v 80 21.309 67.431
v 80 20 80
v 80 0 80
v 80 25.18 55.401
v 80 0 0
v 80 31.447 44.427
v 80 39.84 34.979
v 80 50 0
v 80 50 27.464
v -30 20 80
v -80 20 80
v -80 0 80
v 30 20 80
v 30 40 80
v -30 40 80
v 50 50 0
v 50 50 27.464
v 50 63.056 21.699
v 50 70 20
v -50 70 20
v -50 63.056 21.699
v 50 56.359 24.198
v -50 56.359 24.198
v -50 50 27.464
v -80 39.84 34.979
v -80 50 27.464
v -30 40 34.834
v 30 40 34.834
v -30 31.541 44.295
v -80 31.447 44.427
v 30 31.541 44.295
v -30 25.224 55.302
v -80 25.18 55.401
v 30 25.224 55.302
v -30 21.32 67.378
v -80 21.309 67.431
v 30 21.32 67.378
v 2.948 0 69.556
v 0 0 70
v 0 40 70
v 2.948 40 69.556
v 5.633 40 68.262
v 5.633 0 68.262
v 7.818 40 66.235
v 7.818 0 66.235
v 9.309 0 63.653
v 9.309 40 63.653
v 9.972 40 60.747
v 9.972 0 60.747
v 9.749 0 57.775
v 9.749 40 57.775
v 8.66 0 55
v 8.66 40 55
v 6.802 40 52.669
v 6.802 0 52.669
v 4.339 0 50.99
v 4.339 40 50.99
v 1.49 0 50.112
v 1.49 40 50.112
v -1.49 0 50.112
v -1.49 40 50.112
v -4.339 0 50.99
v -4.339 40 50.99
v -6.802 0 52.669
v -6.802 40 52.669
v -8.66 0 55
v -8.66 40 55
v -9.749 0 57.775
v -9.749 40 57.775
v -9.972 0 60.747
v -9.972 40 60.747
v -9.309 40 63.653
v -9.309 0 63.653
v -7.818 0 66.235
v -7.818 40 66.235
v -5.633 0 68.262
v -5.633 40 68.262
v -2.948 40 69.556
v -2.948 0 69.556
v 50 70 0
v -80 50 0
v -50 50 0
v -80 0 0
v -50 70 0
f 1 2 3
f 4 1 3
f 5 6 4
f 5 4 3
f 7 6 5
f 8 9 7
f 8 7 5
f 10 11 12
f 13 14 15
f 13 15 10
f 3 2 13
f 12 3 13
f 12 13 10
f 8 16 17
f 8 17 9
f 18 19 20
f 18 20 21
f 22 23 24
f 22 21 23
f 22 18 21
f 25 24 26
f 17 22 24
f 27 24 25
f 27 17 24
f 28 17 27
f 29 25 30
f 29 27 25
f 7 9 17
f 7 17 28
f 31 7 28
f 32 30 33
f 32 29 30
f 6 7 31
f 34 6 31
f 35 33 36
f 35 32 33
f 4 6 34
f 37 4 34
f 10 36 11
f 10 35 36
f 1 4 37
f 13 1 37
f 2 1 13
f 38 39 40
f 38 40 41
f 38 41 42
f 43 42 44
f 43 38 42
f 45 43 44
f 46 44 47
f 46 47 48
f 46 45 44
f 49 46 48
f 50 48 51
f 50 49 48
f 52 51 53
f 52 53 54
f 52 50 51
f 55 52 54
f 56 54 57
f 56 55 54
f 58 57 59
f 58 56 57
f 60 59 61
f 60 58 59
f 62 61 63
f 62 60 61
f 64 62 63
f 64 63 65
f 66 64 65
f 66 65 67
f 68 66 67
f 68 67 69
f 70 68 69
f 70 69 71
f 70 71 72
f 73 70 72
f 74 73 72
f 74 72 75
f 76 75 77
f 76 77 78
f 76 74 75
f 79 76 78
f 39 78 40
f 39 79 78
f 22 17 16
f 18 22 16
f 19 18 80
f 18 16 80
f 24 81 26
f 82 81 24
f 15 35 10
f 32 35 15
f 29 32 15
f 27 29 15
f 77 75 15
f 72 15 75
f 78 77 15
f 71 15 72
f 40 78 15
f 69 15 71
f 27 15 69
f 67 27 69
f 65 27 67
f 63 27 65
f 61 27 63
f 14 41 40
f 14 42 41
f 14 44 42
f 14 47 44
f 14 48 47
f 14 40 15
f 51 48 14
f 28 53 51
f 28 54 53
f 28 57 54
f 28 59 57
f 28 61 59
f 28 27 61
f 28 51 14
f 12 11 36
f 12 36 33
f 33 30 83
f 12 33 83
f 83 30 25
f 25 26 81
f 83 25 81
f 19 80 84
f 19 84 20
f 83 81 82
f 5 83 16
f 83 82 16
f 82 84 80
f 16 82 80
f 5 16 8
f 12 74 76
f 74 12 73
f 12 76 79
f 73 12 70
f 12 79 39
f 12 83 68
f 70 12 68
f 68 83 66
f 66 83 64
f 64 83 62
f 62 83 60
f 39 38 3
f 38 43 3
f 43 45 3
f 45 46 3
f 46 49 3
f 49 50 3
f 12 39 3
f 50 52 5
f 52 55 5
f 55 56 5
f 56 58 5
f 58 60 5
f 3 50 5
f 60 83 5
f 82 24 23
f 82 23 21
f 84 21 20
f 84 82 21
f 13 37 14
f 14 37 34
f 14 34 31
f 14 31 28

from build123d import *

# Parameters (mm, degrees)
SALIENTE_EXTRUIR1_DEPTH    = 80
CROQUIS2_W                 = 30
CROQUIS2_H                 = 20
CORTAR_EXTRUIR1_DEPTH      = 81
CORTAR_EXTRUIR1_DEPTH_BACK = 1
CROQUIS3_W                 = 60
CROQUIS3_H                 = 40
SALIENTE_EXTRUIR2_DEPTH    = 80
CROQUIS4_R                 = 10
CORTAR_EXTRUIR2_DEPTH      = 40


with BuildPart() as part:
    # Croquis1 → Saliente-Extruir1 (new body, symmetric)
    with BuildSketch(Plane(origin=(0, 0, 0), x_dir=(0, 0, -1), z_dir=(1, 0, 0))):
        with BuildLine():
            Line((0, 0), (0, 70))
            Line((0, 70), (-20, 70))
            ThreePointArc((-20, 70), (-40.94875162, 34.138501945), (-80, 20))
            Line((-80, 20), (-80, 0))
            Line((-80, 0), (0, 0))
        make_face()
    extrude(amount=SALIENTE_EXTRUIR1_DEPTH, both=True)

    # Croquis2 → Cortar-Extruir1 (cut, two sides)
    with BuildSketch(Plane.XY) as cortar_extruir1_sk:
        with Locations((-65, 60)):
            Rectangle(CROQUIS2_W, CROQUIS2_H)
        with Locations((65, 60)):
            Rectangle(CROQUIS2_W, CROQUIS2_H)
    extrude(amount=CORTAR_EXTRUIR1_DEPTH, mode=Mode.SUBTRACT)
    extrude(cortar_extruir1_sk.sketch, amount=-CORTAR_EXTRUIR1_DEPTH_BACK, mode=Mode.SUBTRACT)

    # Croquis3 → Saliente-Extruir2 (add)
    with BuildSketch(Plane.XY):
        with Locations((0, 20)):
            Rectangle(CROQUIS3_W, CROQUIS3_H)
    extrude(amount=SALIENTE_EXTRUIR2_DEPTH)

    # Croquis4 → Cortar-Extruir2 (cut)
    with BuildSketch(Plane(origin=(0, 0, 0), x_dir=(1, 0, 0), z_dir=(0, 1, 0))):
        with Locations(Location((0, -60, 0), (0, 0, 270))):  # turned: the seam where the file's is
            Circle(CROQUIS4_R)
    extrude(amount=CORTAR_EXTRUIR2_DEPTH, mode=Mode.SUBTRACT)


solid = part.part
